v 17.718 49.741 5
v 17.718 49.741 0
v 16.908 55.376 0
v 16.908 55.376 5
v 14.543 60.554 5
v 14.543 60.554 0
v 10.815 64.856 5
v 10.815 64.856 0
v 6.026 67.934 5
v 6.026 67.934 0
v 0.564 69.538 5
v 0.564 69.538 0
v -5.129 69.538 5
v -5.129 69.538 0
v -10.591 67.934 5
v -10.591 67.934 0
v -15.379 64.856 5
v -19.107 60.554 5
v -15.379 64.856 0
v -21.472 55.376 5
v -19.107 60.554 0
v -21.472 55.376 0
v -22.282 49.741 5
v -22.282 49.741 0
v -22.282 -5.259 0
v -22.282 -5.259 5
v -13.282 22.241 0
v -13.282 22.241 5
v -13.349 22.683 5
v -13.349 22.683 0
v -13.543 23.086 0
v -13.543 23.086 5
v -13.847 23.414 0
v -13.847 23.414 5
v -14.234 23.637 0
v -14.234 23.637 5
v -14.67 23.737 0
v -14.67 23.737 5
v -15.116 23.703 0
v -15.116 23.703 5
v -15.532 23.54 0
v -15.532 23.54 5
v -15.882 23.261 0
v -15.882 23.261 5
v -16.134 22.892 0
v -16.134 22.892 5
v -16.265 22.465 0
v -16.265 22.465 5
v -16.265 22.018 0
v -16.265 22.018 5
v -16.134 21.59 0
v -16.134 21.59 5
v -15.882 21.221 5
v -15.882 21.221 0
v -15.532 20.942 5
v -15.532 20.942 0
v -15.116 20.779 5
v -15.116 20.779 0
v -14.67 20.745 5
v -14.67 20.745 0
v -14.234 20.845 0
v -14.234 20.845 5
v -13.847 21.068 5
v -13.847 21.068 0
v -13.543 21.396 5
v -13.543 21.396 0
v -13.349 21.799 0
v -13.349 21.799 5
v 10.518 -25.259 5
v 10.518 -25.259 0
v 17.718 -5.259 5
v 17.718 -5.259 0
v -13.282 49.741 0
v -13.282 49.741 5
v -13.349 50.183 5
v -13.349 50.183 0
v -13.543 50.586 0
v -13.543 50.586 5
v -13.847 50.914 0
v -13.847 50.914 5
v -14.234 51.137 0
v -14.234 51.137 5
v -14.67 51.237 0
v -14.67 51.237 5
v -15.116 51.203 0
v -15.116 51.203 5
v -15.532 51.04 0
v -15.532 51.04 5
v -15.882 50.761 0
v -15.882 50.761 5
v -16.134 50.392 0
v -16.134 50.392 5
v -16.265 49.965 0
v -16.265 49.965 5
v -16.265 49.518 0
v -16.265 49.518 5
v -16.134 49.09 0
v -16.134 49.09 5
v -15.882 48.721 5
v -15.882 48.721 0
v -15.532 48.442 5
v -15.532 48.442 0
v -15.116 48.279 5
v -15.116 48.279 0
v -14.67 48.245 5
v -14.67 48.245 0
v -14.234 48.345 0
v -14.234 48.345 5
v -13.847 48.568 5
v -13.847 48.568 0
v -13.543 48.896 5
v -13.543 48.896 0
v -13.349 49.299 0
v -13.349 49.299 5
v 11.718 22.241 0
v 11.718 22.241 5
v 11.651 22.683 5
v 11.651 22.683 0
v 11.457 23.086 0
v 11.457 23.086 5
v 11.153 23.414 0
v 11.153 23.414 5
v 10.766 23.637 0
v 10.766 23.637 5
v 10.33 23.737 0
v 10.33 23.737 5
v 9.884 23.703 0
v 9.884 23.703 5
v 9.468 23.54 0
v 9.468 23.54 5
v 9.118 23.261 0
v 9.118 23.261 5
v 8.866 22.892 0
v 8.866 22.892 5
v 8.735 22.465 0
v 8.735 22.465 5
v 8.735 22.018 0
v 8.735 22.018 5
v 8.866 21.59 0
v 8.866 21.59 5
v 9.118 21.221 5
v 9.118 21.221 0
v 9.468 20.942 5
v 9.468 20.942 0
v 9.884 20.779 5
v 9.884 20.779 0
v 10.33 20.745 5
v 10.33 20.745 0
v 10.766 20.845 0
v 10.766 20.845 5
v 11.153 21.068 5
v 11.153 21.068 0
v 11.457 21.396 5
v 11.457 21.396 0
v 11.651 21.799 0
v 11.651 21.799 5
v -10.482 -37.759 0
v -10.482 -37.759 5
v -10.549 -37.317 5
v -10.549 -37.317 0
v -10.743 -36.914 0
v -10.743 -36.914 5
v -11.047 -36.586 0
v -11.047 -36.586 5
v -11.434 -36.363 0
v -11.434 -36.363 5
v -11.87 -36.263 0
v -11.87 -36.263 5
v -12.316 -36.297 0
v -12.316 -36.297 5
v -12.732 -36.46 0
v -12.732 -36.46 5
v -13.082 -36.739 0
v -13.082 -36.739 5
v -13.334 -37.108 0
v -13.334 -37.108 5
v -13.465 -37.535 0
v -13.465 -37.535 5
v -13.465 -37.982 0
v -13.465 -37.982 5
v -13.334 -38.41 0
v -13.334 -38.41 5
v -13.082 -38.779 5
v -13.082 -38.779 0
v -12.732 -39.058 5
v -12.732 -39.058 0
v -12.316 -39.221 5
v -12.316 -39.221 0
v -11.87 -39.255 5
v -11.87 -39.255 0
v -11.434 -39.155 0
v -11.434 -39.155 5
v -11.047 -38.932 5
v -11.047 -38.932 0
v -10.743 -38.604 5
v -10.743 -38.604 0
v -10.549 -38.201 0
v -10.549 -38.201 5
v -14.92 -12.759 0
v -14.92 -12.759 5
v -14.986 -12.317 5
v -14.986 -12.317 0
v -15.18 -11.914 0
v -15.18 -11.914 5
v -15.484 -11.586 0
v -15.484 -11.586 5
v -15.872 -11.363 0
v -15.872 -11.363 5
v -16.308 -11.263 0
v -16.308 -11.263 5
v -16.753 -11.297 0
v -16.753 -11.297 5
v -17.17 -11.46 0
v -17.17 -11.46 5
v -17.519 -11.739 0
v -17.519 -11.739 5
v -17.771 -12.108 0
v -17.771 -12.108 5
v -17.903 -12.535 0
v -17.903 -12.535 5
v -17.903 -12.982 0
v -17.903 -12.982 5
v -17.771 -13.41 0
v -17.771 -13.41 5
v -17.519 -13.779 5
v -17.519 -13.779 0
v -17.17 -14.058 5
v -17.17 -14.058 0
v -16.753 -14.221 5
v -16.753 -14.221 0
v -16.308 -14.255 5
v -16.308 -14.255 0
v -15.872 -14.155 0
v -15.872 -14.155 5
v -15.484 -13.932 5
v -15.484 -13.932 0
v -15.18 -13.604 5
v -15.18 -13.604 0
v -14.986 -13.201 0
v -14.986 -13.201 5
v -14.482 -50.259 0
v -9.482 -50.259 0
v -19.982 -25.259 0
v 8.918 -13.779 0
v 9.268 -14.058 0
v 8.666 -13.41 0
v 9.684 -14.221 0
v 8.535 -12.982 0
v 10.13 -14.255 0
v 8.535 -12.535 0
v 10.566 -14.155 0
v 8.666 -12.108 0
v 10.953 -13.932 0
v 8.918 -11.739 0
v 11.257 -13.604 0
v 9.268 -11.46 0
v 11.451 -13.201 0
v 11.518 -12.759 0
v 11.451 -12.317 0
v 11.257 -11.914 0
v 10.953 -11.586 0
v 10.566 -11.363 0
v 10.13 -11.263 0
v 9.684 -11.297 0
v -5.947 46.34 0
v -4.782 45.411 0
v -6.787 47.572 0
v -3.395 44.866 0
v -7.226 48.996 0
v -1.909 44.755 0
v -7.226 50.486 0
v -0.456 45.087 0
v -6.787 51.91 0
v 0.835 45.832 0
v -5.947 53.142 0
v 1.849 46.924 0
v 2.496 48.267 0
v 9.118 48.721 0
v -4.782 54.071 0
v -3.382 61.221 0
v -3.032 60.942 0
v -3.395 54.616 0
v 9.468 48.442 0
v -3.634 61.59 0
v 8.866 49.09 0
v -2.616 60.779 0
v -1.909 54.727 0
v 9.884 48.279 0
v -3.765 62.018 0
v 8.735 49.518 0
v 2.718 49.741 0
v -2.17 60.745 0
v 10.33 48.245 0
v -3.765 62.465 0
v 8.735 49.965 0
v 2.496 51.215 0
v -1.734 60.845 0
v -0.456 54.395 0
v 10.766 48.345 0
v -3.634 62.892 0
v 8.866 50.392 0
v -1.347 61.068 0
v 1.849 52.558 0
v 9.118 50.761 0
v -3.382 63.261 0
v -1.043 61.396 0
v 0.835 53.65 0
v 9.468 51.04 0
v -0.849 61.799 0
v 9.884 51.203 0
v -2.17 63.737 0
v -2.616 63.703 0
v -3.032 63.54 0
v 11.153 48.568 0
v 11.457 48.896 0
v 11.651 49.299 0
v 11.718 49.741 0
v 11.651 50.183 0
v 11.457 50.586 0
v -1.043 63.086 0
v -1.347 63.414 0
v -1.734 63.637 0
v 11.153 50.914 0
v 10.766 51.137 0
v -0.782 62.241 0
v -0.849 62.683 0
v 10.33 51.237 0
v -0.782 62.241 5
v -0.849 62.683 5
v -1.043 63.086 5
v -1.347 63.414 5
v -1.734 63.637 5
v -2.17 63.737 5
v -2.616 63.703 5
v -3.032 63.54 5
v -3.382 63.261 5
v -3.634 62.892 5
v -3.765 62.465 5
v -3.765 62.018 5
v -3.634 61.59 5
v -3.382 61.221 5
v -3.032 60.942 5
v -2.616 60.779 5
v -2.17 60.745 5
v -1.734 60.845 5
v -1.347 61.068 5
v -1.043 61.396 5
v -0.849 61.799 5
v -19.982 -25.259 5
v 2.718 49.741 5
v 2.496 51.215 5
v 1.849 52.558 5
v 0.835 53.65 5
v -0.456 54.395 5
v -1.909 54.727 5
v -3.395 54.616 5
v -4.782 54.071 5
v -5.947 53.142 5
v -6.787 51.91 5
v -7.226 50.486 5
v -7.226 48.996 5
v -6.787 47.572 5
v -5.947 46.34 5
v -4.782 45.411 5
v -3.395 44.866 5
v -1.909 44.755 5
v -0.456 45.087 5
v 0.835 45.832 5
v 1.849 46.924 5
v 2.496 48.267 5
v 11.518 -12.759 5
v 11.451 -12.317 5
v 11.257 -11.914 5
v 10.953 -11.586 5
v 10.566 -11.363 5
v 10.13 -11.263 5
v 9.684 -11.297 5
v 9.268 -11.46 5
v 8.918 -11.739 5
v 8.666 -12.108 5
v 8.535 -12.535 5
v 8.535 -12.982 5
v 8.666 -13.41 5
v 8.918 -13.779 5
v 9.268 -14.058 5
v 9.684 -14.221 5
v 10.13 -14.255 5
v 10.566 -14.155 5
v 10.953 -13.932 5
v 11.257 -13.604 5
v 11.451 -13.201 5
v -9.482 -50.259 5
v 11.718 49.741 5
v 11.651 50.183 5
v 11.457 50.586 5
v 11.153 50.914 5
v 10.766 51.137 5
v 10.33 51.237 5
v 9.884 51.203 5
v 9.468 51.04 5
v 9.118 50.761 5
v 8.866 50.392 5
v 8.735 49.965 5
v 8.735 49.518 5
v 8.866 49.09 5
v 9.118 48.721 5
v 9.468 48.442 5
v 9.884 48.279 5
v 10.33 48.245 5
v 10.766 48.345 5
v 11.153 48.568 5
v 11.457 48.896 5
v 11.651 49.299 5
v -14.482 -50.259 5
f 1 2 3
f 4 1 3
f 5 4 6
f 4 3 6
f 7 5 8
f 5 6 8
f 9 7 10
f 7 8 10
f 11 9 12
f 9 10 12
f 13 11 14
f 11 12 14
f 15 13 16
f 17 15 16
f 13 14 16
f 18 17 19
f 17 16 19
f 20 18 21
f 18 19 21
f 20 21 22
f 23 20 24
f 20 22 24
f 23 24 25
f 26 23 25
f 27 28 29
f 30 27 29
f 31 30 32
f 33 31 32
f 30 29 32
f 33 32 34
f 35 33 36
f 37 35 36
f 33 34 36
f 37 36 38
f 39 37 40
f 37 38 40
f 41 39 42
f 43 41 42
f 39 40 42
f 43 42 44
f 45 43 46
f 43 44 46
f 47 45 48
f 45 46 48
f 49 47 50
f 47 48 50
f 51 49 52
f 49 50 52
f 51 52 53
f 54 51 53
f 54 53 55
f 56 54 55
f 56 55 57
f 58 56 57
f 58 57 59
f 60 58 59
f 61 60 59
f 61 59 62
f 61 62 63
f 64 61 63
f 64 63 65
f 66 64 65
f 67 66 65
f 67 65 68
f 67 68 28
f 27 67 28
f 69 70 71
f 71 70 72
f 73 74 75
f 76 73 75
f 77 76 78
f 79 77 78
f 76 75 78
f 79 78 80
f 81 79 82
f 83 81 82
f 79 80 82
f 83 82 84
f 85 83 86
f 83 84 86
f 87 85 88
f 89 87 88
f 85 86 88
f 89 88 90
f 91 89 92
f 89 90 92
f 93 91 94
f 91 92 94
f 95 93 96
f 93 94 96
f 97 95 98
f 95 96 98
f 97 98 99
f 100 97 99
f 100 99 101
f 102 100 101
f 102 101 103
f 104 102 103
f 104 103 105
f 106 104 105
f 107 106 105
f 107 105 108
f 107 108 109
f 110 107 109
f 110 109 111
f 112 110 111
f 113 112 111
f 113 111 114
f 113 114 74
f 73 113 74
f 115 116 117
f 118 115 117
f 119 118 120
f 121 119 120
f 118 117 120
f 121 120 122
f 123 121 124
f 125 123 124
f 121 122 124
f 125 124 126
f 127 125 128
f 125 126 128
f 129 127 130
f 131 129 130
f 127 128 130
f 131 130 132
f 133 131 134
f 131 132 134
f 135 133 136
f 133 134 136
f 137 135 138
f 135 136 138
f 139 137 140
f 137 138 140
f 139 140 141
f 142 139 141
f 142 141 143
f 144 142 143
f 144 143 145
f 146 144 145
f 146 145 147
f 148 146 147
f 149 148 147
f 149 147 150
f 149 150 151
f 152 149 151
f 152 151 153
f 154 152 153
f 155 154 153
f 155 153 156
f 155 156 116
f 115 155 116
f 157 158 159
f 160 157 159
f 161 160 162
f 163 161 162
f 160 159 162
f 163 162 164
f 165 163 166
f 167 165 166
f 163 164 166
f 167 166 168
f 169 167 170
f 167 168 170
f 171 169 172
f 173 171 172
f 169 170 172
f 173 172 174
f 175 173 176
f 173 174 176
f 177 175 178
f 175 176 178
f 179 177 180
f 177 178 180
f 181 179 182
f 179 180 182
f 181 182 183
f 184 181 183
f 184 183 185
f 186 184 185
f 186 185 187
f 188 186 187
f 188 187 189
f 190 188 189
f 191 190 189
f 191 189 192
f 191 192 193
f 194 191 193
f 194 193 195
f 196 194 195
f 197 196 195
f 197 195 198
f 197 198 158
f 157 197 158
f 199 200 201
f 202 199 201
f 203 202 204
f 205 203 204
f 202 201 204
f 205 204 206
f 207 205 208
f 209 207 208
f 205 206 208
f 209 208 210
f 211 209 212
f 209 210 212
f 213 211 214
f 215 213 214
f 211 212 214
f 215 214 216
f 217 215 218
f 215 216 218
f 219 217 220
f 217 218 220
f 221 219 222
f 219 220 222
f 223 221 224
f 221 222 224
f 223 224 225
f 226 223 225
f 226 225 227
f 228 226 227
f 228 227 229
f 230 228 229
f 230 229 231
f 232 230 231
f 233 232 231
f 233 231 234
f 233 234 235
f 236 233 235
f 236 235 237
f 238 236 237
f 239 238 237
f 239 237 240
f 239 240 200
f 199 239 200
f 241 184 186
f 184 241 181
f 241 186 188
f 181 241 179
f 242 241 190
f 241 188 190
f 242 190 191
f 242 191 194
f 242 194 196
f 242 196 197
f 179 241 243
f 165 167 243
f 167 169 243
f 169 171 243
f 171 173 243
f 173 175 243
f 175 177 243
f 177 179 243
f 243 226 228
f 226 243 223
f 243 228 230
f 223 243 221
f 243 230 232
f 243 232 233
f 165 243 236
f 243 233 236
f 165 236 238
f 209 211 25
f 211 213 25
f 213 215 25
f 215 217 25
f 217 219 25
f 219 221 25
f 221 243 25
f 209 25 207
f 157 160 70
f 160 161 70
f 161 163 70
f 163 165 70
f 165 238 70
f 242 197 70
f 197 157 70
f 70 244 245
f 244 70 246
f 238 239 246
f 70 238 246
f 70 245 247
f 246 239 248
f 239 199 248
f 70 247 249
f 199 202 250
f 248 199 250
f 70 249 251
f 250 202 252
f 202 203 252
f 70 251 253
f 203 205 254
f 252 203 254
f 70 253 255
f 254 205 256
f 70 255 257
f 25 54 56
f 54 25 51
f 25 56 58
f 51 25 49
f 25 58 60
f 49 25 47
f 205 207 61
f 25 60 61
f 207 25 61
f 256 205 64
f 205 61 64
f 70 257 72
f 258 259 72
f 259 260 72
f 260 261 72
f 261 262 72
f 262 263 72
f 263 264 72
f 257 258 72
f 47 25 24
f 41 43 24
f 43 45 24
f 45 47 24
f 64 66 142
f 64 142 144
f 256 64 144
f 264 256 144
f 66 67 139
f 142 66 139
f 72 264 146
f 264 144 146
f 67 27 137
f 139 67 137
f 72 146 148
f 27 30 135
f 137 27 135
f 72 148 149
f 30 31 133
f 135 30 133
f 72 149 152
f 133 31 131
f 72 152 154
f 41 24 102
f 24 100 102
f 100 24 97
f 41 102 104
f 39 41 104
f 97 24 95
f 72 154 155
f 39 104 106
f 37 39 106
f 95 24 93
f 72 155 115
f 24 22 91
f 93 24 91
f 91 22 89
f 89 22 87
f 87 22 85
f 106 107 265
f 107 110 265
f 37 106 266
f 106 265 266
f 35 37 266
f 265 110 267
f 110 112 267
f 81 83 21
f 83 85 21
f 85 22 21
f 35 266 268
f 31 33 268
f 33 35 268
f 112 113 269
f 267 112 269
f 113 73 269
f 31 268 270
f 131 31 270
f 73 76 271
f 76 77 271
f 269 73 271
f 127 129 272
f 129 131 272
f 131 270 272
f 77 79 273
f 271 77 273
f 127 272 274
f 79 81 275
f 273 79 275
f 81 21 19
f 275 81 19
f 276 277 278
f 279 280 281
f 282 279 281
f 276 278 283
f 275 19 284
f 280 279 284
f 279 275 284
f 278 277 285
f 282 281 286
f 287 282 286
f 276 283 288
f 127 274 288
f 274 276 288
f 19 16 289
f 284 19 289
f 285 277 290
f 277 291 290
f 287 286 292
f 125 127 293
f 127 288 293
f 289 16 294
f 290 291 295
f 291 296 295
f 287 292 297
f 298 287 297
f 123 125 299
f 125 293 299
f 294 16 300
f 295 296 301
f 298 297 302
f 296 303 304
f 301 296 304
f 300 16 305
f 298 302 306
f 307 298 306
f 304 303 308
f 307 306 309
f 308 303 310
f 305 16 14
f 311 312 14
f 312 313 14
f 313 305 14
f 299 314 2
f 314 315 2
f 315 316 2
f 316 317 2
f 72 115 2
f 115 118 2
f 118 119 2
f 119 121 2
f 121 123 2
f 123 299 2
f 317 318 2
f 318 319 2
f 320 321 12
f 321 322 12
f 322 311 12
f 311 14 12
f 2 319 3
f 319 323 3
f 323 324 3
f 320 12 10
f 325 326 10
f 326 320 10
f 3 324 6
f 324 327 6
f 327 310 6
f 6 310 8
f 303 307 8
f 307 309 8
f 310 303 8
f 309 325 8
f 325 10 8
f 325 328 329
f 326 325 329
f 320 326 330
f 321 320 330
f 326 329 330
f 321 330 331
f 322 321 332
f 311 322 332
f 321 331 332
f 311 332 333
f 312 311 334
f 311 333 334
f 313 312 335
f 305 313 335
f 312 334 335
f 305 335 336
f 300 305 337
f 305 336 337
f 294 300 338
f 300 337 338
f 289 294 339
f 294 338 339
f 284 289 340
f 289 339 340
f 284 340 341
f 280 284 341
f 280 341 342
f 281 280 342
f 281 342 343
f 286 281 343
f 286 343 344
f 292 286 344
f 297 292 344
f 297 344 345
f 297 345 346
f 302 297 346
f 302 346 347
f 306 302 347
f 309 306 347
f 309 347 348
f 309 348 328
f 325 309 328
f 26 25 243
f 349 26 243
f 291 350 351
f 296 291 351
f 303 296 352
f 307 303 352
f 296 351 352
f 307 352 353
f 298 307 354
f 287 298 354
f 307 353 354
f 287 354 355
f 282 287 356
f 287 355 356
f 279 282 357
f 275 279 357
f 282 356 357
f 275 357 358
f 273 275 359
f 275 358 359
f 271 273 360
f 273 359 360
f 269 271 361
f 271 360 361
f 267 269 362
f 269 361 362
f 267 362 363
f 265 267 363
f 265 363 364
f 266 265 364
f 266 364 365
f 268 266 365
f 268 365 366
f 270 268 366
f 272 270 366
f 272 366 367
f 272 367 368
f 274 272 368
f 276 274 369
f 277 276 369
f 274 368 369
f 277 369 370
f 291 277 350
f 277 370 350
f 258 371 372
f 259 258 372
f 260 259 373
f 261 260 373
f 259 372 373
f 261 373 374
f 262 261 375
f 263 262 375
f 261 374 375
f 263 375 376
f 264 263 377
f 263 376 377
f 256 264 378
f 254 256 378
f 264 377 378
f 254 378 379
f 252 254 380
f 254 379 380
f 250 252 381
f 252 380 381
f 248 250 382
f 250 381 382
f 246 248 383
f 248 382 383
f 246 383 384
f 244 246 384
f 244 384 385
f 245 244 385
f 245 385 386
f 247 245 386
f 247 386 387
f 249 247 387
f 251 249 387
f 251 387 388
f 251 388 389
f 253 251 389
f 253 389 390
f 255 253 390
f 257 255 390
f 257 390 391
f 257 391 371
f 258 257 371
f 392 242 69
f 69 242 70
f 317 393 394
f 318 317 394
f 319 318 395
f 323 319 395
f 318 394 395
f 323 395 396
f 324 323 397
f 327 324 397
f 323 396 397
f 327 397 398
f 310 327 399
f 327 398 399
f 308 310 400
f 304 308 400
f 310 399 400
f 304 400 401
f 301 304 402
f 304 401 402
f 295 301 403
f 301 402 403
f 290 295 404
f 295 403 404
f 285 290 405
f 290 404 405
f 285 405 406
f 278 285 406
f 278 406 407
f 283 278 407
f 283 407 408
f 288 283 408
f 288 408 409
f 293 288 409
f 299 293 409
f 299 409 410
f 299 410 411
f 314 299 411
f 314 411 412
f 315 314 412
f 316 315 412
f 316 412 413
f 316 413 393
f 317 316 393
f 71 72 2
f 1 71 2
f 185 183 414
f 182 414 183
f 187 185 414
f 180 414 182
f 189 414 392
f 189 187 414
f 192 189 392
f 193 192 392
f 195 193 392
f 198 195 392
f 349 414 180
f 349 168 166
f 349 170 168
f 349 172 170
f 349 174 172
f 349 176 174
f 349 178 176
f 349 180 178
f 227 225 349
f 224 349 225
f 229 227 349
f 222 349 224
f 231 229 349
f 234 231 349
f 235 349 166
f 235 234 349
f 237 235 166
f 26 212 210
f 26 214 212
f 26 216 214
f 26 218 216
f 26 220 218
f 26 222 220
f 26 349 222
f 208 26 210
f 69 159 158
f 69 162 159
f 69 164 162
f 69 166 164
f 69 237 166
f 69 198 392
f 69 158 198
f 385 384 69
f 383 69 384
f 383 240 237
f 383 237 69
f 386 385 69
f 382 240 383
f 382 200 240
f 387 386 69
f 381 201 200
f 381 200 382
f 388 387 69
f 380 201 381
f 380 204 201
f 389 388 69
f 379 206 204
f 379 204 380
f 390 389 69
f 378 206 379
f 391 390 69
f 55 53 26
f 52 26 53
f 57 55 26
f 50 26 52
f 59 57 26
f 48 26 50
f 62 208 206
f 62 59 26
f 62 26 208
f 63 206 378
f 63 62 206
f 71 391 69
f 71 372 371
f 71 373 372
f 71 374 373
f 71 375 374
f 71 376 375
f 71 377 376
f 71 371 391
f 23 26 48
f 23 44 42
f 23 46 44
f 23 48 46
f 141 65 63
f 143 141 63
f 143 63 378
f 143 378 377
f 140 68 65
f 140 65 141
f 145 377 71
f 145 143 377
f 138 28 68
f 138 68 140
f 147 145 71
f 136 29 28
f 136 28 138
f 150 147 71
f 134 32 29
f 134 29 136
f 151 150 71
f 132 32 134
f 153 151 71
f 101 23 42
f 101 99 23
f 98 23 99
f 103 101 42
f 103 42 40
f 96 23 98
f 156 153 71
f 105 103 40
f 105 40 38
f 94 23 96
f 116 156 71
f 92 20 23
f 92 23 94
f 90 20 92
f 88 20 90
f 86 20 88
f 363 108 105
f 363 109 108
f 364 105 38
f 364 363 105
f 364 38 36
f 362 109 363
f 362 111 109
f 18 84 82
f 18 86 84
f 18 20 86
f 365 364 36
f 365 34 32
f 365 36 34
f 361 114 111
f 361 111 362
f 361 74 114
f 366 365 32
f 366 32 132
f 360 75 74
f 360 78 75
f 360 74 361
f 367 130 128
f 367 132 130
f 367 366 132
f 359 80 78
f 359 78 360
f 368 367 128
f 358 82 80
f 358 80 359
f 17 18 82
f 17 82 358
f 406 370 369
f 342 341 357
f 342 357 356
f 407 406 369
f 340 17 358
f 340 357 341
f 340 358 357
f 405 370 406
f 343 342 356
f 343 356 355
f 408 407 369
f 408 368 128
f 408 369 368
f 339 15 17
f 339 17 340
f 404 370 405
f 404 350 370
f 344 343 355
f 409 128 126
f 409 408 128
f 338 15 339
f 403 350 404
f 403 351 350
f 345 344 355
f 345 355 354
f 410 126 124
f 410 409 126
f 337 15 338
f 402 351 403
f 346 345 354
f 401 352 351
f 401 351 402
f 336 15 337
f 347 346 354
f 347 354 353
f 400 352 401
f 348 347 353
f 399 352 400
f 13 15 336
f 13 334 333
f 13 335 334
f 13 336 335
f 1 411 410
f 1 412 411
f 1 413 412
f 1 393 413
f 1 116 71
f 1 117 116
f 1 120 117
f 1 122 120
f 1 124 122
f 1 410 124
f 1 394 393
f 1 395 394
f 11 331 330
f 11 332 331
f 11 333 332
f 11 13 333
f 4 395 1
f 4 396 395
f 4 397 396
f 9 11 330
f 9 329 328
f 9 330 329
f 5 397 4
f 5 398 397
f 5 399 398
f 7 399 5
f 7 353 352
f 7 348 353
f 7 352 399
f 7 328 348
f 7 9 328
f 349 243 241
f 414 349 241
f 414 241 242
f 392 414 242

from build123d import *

# Parameters (mm, degrees)
EXTRUDE_1_DEPTH     = 5
SKETCH_2_R          = 5
CUT_EXTRUDE_1_DEPTH = 5
CUT_EXTRUDE_2_REACH = 75.385
SKETCH_3_R          = 1.5


with BuildPart() as part:
    # 草图1 → 凸台-拉伸1 (new body)
    with BuildSketch(Plane.XY):
        with BuildLine():
            Line((-22.282205337, 49.741076161), (-22.282205337, -5.258923839))
            Line((-22.282205337, -5.258923839), (-19.982205337, -25.258923839))
            Line((-19.982205337, -25.258923839), (-14.482205337, -50.258923839))
            Line((-14.482205337, -50.258923839), (-9.482205337, -50.258923839))
            Line((-9.482205337, -50.258923839), (10.517794663, -25.258923839))
            Line((10.517794663, -25.258923839), (17.717794663, -5.258923839))
            Line((17.717794663, -5.258923839), (17.717794663, 49.741076161))
            ThreePointArc((17.717794663, 49.741076161), (-2.282205337, 69.741076161), (-22.282205337, 49.741076161))
        make_face()
    extrude(amount=EXTRUDE_1_DEPTH)

    # 草图2 → 切除-拉伸1 (cut)
    with BuildSketch(Plane.XY.offset(5)):
        with Locations((-2.282205337, 49.741076161)):
            Circle(SKETCH_2_R)
    extrude(amount=-CUT_EXTRUDE_1_DEPTH, mode=Mode.SUBTRACT)

    # 草图3 → 切除-拉伸2 (cut, up to next)
    with BuildSketch(Plane.XY.offset(5), mode=Mode.PRIVATE) as cut_extrude_2_sk1:
        with Locations((-11.982205337, -37.758923839)):
            Circle(SKETCH_3_R)
    cut_extrude_2_tool1 = extrude(cut_extrude_2_sk1.sketch, amount=-CUT_EXTRUDE_2_REACH, mode=Mode.PRIVATE) & part.part
    # 草图3 → 切除-拉伸2 (cut, up to next)
    with BuildSketch(Plane.XY.offset(5), mode=Mode.PRIVATE) as cut_extrude_2_sk2:
        with Locations((-14.782205337, 49.741076161)):
            Circle(SKETCH_3_R)
    cut_extrude_2_tool2 = extrude(cut_extrude_2_sk2.sketch, amount=-CUT_EXTRUDE_2_REACH, mode=Mode.PRIVATE) & part.part
    # 草图3 → 切除-拉伸2 (cut, up to next)
    with BuildSketch(Plane.XY.offset(5), mode=Mode.PRIVATE) as cut_extrude_2_sk3:
        with Locations((10.217794663, 49.741076161)):
            Circle(SKETCH_3_R)
    cut_extrude_2_tool3 = extrude(cut_extrude_2_sk3.sketch, amount=-CUT_EXTRUDE_2_REACH, mode=Mode.PRIVATE) & part.part
    # 草图3 → 切除-拉伸2 (cut, up to next)
    with BuildSketch(Plane.XY.offset(5), mode=Mode.PRIVATE) as cut_extrude_2_sk4:
        with Locations((-2.282205337, 62.241076161)):
            Circle(SKETCH_3_R)
    cut_extrude_2_tool4 = extrude(cut_extrude_2_sk4.sketch, amount=-CUT_EXTRUDE_2_REACH, mode=Mode.PRIVATE) & part.part
    # 草图3 → 切除-拉伸2 (cut, up to next)
    with BuildSketch(Plane.XY.offset(5), mode=Mode.PRIVATE) as cut_extrude_2_sk5:
        with Locations((10.217794663, 22.241076161)):
            Circle(SKETCH_3_R)
    cut_extrude_2_tool5 = extrude(cut_extrude_2_sk5.sketch, amount=-CUT_EXTRUDE_2_REACH, mode=Mode.PRIVATE) & part.part
    # 草图3 → 切除-拉伸2 (cut, up to next)
    with BuildSketch(Plane.XY.offset(5), mode=Mode.PRIVATE) as cut_extrude_2_sk6:
        with Locations((-14.782205337, 22.241076161)):
            Circle(SKETCH_3_R)
    cut_extrude_2_tool6 = extrude(cut_extrude_2_sk6.sketch, amount=-CUT_EXTRUDE_2_REACH, mode=Mode.PRIVATE) & part.part
    # 草图3 → 切除-拉伸2 (cut, up to next)
    with BuildSketch(Plane.XY.offset(5), mode=Mode.PRIVATE) as cut_extrude_2_sk7:
        with Locations((-16.419705337, -12.758923839)):
            Circle(SKETCH_3_R)
    cut_extrude_2_tool7 = extrude(cut_extrude_2_sk7.sketch, amount=-CUT_EXTRUDE_2_REACH, mode=Mode.PRIVATE) & part.part
    # 草图3 → 切除-拉伸2 (cut, up to next)
    with BuildSketch(Plane.XY.offset(5), mode=Mode.PRIVATE) as cut_extrude_2_sk8:
        with Locations((10.017794663, -12.758923839)):
            Circle(SKETCH_3_R)
    cut_extrude_2_tool8 = extrude(cut_extrude_2_sk8.sketch, amount=-CUT_EXTRUDE_2_REACH, mode=Mode.PRIVATE) & part.part
    add(cut_extrude_2_tool1.solids().sort_by_distance((-11.982205, -37.758924, 5))[0], mode=Mode.SUBTRACT)
    add(cut_extrude_2_tool2.solids().sort_by_distance((-14.782205, 49.741076, 5))[0], mode=Mode.SUBTRACT)
    add(cut_extrude_2_tool3.solids().sort_by_distance((10.217795, 49.741076, 5))[0], mode=Mode.SUBTRACT)
    add(cut_extrude_2_tool4.solids().sort_by_distance((-2.282205, 62.241076, 5))[0], mode=Mode.SUBTRACT)
    add(cut_extrude_2_tool5.solids().sort_by_distance((10.217795, 22.241076, 5))[0], mode=Mode.SUBTRACT)
    add(cut_extrude_2_tool6.solids().sort_by_distance((-14.782205, 22.241076, 5))[0], mode=Mode.SUBTRACT)
    add(cut_extrude_2_tool7.solids().sort_by_distance((-16.419705, -12.758924, 5))[0], mode=Mode.SUBTRACT)
    add(cut_extrude_2_tool8.solids().sort_by_distance((10.017795, -12.758924, 5))[0], mode=Mode.SUBTRACT)


solid = part.part
